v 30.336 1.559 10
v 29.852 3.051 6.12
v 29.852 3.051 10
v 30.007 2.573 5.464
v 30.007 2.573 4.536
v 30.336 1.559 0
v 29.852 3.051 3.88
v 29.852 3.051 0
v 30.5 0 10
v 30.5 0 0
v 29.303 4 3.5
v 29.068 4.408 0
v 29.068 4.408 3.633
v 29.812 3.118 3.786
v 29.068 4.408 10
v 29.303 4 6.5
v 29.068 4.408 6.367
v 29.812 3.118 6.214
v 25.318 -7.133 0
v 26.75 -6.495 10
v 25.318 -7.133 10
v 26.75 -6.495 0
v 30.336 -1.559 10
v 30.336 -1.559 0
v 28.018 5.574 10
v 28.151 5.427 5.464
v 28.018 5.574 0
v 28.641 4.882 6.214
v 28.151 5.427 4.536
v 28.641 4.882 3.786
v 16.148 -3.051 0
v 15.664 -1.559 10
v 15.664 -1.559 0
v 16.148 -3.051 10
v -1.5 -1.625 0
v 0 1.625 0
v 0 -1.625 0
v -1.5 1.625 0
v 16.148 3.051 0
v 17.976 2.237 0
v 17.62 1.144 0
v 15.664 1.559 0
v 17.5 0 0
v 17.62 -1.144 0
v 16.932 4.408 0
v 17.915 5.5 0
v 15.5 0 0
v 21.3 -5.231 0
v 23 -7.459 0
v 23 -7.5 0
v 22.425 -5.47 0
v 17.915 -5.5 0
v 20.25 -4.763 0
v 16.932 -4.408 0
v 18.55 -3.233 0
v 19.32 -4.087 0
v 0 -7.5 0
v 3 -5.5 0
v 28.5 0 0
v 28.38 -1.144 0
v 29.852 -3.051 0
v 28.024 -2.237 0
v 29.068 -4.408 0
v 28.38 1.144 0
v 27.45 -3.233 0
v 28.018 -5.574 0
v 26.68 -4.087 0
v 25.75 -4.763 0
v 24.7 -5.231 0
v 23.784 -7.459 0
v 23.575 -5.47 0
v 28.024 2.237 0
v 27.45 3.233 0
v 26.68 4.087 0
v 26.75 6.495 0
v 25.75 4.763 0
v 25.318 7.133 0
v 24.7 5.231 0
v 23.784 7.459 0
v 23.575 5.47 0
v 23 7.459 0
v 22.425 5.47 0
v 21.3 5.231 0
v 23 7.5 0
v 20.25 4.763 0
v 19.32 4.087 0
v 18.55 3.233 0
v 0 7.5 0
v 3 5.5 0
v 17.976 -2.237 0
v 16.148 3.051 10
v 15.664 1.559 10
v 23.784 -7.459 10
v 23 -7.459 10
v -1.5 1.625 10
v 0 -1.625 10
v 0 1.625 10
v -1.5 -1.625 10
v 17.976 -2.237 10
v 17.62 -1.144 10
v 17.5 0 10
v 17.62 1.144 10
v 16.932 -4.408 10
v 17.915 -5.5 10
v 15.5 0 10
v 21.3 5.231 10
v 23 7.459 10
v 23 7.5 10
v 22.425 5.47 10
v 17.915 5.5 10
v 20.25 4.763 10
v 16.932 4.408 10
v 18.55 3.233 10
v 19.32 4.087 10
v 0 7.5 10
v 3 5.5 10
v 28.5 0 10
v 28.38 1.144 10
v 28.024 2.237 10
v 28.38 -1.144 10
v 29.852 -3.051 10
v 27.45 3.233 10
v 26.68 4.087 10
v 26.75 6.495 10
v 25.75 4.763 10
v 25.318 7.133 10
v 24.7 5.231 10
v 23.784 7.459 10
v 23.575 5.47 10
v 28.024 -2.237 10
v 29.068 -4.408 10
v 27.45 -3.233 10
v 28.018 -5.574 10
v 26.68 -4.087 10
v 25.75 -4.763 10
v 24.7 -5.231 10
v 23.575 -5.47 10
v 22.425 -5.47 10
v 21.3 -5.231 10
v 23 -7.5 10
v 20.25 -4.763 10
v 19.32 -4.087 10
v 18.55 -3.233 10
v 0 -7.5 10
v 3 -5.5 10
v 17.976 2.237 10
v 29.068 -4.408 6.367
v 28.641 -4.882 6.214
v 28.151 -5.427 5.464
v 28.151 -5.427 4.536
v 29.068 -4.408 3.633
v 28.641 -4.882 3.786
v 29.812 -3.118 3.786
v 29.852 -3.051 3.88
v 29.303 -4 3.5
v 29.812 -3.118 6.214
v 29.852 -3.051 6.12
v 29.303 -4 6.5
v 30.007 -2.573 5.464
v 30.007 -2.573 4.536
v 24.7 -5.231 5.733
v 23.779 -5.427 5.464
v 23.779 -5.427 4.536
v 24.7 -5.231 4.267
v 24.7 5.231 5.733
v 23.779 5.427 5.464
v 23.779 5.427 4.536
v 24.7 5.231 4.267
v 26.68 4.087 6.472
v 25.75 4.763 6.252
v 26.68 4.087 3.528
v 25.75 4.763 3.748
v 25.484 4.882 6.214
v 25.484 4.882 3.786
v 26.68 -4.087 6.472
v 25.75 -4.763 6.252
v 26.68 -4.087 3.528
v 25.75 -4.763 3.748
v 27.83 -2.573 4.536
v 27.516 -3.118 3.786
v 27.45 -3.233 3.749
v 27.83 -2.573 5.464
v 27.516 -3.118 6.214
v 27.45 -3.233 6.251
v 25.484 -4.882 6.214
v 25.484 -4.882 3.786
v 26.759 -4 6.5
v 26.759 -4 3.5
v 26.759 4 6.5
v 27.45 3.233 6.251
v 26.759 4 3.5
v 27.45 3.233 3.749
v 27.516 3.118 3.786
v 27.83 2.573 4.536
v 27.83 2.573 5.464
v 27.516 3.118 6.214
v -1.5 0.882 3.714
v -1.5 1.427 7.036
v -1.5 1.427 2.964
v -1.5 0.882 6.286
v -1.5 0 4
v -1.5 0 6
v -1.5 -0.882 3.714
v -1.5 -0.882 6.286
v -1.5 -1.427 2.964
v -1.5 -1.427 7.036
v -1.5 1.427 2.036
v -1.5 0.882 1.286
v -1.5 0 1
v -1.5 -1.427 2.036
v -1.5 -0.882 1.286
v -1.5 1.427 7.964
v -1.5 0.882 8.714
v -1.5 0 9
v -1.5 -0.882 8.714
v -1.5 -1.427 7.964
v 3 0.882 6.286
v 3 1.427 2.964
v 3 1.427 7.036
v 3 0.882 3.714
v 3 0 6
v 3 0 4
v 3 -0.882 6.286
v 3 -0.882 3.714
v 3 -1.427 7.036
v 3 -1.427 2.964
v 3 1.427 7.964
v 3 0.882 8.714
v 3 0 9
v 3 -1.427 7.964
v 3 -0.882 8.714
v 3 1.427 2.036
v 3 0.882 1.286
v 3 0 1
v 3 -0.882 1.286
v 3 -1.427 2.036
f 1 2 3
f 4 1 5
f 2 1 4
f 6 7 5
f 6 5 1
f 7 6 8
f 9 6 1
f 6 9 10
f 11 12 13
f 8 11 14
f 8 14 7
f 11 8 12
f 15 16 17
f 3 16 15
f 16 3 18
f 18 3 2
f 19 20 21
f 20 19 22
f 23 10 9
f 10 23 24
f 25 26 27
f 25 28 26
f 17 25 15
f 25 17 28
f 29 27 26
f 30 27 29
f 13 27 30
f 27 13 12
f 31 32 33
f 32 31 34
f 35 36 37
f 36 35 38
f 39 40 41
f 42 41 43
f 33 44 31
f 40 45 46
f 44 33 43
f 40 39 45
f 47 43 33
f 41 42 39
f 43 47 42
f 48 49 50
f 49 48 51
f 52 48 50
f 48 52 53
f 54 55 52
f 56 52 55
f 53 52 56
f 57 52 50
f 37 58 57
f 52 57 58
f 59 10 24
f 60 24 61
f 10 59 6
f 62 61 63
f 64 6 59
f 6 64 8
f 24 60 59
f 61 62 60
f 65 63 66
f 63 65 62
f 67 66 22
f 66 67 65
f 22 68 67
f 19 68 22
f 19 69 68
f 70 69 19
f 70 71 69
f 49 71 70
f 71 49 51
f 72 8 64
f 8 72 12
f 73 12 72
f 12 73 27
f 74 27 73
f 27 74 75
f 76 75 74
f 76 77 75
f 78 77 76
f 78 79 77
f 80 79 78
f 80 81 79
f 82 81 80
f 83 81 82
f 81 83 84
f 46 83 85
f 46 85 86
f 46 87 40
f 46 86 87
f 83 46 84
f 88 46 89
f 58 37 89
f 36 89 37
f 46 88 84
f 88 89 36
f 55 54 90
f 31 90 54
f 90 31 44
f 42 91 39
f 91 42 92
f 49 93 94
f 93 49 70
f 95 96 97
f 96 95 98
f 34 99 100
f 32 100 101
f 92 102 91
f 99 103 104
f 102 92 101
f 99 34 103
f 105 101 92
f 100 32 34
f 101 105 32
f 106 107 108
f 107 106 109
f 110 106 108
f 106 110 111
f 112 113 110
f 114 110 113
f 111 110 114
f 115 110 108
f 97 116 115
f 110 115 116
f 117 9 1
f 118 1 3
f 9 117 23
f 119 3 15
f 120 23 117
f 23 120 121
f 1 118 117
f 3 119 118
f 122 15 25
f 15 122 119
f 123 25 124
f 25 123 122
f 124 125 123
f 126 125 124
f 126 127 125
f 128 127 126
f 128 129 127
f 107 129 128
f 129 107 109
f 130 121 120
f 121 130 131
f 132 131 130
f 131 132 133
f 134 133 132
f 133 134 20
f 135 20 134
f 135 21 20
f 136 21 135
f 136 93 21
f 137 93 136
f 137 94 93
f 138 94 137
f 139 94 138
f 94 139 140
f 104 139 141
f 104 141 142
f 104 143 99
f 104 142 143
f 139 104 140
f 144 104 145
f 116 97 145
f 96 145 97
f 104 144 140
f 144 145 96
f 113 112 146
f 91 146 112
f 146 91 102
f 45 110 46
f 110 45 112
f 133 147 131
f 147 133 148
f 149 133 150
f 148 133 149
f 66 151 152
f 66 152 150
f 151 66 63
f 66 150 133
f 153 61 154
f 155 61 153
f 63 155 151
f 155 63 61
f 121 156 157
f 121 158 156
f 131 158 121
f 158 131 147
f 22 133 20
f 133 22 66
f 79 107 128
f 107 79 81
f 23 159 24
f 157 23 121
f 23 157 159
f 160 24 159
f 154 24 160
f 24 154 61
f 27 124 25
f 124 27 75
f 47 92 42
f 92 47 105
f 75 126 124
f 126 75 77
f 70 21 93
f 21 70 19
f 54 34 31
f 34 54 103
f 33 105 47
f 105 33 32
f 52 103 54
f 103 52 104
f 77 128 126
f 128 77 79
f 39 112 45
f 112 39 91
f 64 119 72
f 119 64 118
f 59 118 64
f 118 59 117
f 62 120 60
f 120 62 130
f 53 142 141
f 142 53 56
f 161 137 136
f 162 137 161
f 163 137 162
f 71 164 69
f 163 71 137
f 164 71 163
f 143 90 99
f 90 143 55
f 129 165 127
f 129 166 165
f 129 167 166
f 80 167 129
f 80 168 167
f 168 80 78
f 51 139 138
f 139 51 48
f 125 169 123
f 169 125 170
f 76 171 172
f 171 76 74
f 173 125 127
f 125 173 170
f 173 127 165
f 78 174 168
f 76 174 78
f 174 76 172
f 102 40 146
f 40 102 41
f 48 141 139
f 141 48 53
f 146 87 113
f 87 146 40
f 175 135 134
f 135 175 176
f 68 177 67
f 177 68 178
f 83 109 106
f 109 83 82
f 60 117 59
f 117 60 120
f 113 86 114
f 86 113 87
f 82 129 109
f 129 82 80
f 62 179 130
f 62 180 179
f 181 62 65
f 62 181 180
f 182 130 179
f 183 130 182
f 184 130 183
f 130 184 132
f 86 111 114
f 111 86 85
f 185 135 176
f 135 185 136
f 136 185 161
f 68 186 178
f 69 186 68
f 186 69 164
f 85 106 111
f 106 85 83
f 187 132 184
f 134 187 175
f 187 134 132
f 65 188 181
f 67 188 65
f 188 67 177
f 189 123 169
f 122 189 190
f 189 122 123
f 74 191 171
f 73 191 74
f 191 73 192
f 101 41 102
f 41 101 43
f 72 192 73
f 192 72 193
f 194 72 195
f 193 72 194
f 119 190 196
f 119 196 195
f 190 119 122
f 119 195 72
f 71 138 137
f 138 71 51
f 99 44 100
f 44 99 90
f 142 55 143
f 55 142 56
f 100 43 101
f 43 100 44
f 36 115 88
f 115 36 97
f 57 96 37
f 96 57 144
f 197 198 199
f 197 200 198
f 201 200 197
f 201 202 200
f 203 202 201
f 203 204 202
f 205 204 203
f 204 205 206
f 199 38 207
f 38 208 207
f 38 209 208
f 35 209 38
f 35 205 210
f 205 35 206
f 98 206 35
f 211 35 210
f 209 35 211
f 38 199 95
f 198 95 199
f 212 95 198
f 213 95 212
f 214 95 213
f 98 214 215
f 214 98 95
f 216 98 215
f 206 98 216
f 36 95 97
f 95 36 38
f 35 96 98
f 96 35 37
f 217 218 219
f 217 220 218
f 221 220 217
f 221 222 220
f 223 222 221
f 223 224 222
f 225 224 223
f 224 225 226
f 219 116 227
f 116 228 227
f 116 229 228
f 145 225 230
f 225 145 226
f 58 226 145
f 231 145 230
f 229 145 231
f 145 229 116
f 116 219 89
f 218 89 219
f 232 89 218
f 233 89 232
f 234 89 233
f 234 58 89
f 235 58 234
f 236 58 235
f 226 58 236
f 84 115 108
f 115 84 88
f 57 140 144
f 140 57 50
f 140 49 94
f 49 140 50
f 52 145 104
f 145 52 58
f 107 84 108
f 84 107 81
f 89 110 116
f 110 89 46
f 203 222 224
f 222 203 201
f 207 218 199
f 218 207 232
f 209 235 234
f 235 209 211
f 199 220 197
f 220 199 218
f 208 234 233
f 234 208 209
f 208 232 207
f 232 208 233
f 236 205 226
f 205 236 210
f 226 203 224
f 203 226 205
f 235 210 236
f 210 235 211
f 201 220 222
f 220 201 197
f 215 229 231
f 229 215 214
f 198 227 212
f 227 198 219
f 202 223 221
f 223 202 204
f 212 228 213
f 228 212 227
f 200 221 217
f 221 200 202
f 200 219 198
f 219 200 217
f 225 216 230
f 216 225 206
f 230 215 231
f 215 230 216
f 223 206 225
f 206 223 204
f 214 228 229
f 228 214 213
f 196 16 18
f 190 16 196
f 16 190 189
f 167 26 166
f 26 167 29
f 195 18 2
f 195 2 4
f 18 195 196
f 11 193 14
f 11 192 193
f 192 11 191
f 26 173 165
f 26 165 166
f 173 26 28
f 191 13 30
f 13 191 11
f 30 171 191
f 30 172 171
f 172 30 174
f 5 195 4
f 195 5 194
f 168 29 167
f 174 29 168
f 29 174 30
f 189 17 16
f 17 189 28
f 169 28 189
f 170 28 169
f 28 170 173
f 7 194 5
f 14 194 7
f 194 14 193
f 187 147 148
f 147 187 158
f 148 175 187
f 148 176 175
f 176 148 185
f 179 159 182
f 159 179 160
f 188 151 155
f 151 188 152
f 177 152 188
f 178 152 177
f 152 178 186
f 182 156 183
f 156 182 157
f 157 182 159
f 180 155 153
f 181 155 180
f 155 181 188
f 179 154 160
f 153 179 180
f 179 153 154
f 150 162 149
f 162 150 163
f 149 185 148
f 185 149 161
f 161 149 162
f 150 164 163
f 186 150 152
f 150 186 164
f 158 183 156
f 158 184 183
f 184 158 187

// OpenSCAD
difference()
{
	union()
	{
		translate([-1.5,-1.625,0]) cube([1.5,3.25,10]);
		translate([0,-7.5,0]) cube([3,15,10]);
		translate([3,-7.5,0]) cube([20,2,10]);
		translate([3,5.5,0]) cube([20,2,10]);
		translate([23,0,0]) difference(){
			cylinder(h=10,r=7.5,$fs=1);
			translate([0,0,-1]) cylinder(h=12,r=5.5,$fs=1);
		}
	}
	translate([-4,0,2.5]) rotate([0,90,0]) cylinder(r=1.5,h=8,center=false,$fs=1);
	translate([-4,0,7.5]) rotate([0,90,0]) cylinder(r=1.5,h=8,center=false,$fs=1);
	translate([23,4,5]) rotate([0,90,0]) cylinder(r=1.5,h=12,center=false,$fs=1);
	translate([23,-4,5]) rotate([0,90,0]) cylinder(r=1.5,h=12,center=false,$fs=1);
}
